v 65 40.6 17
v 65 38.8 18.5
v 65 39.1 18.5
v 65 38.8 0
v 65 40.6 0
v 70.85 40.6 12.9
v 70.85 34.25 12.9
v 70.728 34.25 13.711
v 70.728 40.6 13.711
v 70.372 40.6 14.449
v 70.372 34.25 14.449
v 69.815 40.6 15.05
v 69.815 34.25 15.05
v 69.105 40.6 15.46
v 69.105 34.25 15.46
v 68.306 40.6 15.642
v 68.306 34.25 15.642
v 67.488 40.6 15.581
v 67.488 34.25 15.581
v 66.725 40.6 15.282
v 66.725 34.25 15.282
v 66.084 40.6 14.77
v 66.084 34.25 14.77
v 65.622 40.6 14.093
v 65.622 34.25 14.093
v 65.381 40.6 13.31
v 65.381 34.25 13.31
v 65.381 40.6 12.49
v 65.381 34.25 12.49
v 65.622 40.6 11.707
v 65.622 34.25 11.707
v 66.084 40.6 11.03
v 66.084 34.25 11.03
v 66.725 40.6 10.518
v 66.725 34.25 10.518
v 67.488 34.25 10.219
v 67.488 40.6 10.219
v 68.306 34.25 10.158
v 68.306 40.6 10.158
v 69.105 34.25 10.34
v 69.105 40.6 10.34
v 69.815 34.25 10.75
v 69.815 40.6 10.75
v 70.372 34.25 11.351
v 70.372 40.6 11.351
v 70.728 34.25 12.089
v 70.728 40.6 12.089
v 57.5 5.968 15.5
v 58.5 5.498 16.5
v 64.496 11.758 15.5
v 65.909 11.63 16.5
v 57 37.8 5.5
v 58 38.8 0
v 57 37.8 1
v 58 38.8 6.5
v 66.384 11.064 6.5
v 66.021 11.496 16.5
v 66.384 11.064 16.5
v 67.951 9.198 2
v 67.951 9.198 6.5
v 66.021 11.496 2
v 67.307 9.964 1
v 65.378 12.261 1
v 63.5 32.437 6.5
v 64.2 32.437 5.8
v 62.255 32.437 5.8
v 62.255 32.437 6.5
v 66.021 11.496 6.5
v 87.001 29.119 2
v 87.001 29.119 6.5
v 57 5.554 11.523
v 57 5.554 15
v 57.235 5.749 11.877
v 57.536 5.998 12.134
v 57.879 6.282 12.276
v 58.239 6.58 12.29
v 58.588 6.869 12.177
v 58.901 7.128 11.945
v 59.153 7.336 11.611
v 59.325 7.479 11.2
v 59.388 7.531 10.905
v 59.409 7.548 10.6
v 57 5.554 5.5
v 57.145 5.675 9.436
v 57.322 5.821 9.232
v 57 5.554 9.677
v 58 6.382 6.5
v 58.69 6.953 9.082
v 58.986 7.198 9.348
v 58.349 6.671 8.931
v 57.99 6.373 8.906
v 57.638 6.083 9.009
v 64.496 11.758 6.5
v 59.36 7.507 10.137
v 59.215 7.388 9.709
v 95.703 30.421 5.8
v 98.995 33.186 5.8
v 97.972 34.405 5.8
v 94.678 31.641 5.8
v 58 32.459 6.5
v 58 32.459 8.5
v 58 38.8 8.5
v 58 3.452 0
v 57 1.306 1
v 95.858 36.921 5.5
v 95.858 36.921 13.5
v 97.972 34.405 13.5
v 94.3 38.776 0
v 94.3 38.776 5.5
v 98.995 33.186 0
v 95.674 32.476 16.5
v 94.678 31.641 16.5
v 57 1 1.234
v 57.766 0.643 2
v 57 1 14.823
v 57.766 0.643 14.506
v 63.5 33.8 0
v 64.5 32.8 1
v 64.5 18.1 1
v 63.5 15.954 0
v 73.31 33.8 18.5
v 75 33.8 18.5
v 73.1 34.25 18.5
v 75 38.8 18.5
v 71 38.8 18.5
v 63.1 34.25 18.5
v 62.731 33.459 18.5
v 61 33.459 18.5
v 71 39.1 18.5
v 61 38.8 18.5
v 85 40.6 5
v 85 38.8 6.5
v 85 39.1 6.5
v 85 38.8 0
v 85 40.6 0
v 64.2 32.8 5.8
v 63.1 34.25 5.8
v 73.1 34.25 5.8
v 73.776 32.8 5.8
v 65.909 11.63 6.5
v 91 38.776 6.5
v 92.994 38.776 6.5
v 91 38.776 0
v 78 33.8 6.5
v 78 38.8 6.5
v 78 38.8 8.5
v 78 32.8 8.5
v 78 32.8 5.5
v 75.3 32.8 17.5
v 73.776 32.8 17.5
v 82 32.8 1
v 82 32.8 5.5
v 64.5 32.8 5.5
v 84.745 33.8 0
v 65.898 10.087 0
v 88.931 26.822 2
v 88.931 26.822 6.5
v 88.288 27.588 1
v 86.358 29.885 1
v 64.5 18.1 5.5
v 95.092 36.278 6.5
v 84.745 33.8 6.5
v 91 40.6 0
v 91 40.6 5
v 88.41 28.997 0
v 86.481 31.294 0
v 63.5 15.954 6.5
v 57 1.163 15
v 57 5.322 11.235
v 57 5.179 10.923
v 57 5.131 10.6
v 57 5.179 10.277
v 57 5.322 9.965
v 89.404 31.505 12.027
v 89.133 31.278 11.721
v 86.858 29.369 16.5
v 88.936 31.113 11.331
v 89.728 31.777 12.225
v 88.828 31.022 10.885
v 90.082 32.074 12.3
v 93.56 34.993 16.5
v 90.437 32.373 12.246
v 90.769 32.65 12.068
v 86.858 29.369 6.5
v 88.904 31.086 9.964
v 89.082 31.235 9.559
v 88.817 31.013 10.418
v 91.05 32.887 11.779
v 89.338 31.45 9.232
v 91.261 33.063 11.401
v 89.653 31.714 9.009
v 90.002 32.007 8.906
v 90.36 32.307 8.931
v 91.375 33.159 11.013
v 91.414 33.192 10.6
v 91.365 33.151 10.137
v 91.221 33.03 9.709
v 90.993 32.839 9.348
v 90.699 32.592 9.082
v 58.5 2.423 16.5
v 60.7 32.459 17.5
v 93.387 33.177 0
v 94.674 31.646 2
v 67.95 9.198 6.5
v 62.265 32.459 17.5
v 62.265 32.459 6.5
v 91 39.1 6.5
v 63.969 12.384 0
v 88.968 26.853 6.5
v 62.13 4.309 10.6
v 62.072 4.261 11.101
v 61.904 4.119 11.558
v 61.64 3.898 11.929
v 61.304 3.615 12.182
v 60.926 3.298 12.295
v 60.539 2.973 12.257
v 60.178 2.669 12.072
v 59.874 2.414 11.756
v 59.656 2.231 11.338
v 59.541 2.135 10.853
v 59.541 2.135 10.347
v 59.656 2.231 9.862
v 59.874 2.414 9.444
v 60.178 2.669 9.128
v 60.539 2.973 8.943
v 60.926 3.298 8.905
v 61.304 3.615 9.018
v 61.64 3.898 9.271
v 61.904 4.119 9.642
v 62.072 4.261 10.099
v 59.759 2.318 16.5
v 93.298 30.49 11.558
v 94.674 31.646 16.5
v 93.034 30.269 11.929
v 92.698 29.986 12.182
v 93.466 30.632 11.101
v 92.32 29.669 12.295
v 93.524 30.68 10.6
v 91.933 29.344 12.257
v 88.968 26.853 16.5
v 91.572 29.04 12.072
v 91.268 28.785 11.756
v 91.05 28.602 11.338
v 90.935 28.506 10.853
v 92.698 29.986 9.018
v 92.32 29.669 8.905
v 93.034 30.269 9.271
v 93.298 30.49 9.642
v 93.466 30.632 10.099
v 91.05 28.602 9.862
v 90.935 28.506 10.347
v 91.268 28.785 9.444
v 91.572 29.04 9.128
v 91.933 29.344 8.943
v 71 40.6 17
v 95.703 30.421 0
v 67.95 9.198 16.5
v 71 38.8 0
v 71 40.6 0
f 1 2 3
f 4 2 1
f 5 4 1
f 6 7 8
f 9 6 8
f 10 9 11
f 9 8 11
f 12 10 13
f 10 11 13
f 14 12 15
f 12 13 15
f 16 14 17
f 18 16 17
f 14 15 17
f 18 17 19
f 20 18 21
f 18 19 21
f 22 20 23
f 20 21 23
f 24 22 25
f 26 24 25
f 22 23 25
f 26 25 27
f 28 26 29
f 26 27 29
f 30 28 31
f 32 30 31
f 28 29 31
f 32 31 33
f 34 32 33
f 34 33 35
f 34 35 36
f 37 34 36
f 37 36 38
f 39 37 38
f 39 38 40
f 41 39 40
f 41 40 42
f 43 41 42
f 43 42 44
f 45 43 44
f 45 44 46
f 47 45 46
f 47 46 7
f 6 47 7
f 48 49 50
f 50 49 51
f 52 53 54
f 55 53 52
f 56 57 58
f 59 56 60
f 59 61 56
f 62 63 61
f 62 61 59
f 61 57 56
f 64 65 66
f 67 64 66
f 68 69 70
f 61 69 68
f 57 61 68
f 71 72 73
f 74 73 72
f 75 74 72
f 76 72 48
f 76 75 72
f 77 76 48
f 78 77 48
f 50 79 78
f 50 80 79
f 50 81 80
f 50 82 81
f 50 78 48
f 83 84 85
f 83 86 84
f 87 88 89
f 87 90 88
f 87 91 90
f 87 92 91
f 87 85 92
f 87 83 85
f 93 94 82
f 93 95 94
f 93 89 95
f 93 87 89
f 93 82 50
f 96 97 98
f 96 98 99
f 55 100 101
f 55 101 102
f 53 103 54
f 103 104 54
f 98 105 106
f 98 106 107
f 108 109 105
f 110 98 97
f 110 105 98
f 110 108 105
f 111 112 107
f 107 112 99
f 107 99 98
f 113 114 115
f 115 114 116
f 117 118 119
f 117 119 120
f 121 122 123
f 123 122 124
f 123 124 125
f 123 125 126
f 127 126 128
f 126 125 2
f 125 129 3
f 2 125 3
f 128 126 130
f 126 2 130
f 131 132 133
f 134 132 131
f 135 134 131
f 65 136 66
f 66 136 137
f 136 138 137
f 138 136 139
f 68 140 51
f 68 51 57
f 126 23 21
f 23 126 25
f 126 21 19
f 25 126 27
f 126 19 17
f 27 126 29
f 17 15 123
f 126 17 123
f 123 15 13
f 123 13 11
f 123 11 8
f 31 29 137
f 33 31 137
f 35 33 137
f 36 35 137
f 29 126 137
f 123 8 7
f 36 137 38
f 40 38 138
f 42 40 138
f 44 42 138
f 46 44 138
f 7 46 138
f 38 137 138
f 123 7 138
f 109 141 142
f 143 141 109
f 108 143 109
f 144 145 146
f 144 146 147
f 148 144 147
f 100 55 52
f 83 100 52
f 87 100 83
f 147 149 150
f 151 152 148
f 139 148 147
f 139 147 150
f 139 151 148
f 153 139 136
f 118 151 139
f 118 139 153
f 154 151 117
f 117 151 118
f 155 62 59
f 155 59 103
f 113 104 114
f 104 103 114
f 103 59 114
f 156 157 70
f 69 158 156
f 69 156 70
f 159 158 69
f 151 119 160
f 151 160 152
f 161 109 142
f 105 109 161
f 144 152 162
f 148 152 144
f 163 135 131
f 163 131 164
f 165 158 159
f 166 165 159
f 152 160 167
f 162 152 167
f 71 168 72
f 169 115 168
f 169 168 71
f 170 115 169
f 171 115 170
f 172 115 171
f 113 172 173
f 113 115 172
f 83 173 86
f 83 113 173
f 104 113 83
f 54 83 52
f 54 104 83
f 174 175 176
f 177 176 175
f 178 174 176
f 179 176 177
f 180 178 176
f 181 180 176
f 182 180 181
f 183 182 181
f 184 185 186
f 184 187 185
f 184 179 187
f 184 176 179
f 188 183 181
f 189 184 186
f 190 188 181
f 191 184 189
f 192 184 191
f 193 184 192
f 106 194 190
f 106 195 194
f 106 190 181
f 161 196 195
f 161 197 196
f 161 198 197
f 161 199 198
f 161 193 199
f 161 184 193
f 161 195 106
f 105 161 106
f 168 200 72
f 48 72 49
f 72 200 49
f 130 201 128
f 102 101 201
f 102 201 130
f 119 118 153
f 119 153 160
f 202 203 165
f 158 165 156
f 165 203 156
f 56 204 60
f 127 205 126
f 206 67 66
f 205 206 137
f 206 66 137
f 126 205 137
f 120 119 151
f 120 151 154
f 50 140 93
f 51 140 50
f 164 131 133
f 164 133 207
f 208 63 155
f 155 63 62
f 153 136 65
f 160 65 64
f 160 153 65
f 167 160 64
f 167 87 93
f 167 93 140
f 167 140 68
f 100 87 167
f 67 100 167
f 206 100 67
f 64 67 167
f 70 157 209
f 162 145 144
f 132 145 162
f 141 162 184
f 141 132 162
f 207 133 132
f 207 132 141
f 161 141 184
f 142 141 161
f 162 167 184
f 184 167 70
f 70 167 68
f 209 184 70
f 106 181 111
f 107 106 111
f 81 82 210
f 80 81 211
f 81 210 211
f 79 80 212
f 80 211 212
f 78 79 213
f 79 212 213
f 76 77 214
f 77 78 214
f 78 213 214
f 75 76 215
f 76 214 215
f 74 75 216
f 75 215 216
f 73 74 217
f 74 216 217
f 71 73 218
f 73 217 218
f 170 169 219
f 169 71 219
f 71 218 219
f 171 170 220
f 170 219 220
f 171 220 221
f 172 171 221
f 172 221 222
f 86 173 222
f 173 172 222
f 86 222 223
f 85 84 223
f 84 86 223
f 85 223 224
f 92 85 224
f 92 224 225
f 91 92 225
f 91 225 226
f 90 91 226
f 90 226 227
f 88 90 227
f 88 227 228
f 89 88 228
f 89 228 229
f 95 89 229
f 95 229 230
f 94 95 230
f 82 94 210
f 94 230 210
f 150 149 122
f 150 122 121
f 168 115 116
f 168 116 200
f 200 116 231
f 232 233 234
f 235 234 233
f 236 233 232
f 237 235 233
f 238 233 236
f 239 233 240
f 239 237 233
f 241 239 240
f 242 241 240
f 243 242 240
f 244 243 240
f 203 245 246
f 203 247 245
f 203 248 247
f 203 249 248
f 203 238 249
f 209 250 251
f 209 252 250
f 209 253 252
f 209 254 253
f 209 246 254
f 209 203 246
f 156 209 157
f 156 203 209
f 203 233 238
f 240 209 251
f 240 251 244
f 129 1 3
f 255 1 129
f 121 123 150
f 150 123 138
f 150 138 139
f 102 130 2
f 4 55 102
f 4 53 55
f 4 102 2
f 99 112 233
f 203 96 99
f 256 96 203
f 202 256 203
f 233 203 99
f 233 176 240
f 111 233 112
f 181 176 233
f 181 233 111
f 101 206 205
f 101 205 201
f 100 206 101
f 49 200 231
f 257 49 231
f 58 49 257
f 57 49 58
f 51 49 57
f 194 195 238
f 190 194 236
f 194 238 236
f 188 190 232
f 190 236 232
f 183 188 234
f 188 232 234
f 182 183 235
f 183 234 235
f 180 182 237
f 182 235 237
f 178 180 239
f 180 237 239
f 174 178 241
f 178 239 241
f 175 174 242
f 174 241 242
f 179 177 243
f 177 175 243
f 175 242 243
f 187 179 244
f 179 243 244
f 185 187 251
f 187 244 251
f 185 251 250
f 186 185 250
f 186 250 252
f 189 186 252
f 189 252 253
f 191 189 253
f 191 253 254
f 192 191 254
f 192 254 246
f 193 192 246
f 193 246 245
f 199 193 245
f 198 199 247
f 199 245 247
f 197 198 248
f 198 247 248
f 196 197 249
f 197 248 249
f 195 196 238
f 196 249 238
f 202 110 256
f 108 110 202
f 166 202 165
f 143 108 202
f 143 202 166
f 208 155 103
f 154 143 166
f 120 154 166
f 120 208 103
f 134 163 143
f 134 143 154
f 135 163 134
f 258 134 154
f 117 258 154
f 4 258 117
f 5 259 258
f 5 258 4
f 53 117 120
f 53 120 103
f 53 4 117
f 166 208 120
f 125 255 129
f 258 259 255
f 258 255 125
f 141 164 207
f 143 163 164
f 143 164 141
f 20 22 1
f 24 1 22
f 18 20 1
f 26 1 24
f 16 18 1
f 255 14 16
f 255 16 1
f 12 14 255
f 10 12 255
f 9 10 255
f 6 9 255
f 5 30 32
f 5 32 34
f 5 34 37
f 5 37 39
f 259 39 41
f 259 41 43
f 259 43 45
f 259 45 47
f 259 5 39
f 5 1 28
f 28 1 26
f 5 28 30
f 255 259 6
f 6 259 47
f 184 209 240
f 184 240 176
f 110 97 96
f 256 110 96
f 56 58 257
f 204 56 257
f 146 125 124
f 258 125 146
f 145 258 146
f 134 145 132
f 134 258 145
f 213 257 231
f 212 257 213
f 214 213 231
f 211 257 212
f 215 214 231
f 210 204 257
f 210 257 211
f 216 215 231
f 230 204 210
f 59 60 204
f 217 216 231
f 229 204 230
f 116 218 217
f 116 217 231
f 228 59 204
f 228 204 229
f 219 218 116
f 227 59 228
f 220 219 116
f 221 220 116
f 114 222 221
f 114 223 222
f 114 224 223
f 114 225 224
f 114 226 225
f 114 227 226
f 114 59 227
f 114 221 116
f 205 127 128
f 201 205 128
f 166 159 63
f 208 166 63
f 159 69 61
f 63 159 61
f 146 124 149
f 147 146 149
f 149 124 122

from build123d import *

# Parameters (mm, degrees)
PAD019_DEPTH     = 18.5
POCKET042_DEPTH  = 13
POCKET043_DEPTH  = 5
POCKET044_DEPTH  = 15
CHAMFER018_SIZE  = 3
CHAMFER019_SIZE  = 2
CHAMFER020_SIZE  = 1
CHAMFER021_SIZE  = 1
CHAMFER022_SIZE  = 1
CHAMFER023_SIZE  = 1
CHAMFER024_SIZE  = 1
CHAMFER025_SIZE  = 1.5
CHAMFER026_SIZE  = 1
CHAMFER027_SIZE  = 1
CHAMFER028_SIZE  = 1
CHAMFER029_SIZE  = 1
CHAMFER030_SIZE  = 1.5
CHAMFER031_SIZE2 = 3
CHAMFER031_SIZE  = 10
CHAMFER032_SIZE2 = 10
CHAMFER032_SIZE  = 3
CHAMFER033_SIZE  = 1
CHAMFER034_SIZE  = 1.5
CHAMFER035_SIZE  = 1
SKETCH082_R      = 2.75
POCKET045_DEPTH  = 12
SKETCH083_R      = 1.7
POCKET046_DEPTH  = 5


with BuildPart() as part:
    # Sketch078 → Pad019 (new body)
    with BuildSketch(Plane.XY):
        Polygon((0, 38.8), (8, 38.8), (8, 40.6), (14, 40.6), (14, 38.8), (28, 38.8), (28, 40.6), (34, 40.6), (34, 38.7761214391), (37.3, 38.7761214391), (41.9953022309, 33.1864759261), (38.7027713123, 30.4207499545), (37.673663974, 31.6458777382), (31.9308774881, 26.82193709), (30.0013012288, 29.1190516844), (9.0209879336, 11.4955885164), (10.9505641929, 9.198473922), (0, 0), align=None)
        Polygon((7.5, 32.8), (7.5, 18.1), (25, 32.8), align=None, mode=Mode.SUBTRACT)
    extrude(amount=PAD019_DEPTH)

    # Sketch079 → Pocket042 (cut)
    with BuildSketch(Plane.XY.offset(6.5)):
        Polygon((0, 5.5542995553), (8.2661306752, 12.395656), (10.9598026716, 9.1854627211), (31.9879670751, 26.8301877163), (29.8577953381, 29.3688275367), (38.9152591587, 36.9689420879), (34.890976, 41.764896), (21, 41.764896), (21, 32.458794), (1, 32.458794), (1, 41.759258), (0, 41.764896), align=None)
    extrude(amount=POCKET042_DEPTH, mode=Mode.SUBTRACT)

    # Sketch080 → Pocket043 (cut)
    with BuildSketch(Plane.XY.offset(16.5)):
        Polygon((-0.8541061726, -4.3526620467), (49.194970654, 37.6434998606), (44.0526697777, 43.7718554052), (-5.9964070501, 1.7756934982), align=None)
    extrude(amount=POCKET043_DEPTH, mode=Mode.SUBTRACT)

    # Sketch081 → Pocket044 (cut)
    with BuildSketch(Plane.XY.offset(5.8)):
        Polygon((37.0972154509, 31.1536445146), (41.470166846, 34.8229864174), (44.3478623025, 31.3934825187), (39.9749109074, 27.724140616), align=None)
        Polygon((6.1, 34.25), (16.1, 34.25), (16.9452365235, 32.4373844259), (5.2547634765, 32.4373844259), align=None)
    extrude(amount=POCKET044_DEPTH, mode=Mode.SUBTRACT)

    # Chamfer018
    chamfer018_edges = [part.edges().sort_by_distance(p)[0] for p in [
        (39.915045, 35.662973, 16.5),
    ]]
    chamfer(chamfer018_edges, length=CHAMFER018_SIZE)

    # Chamfer019
    chamfer019_edges = [part.edges().sort_by_distance(p)[0] for p in [
        (5.475282, 4.599237, 0),
        (19.511145, 20.30732, 0),
        (34.802271, 29.233907, 0),
    ]]
    chamfer(chamfer019_edges, length=CHAMFER019_SIZE)

    # Chamfer020
    chamfer020_edges = [part.edges().sort_by_distance(p)[0] for p in [
        (9.342584, 11.112736, 0),
        (8.377796, 12.261293, 0),
        (29.358109, 29.884757, 0),
        (30.322897, 28.736199, 0),
    ]]
    chamfer(chamfer020_edges, length=CHAMFER020_SIZE)

    # Chamfer021
    chamfer021_edges = [part.edges().sort_by_distance(p)[0] for p in [
        (7.5, 25.45, 0),
        (16.25, 25.45, 0),
        (16.25, 32.8, 0),
    ]]
    chamfer(chamfer021_edges, length=CHAMFER021_SIZE)

    # Chamfer022
    chamfer022_edges = [part.edges().sort_by_distance(p)[0] for p in [
        (0, 20.705986, 0),
        (0, 22.17715, 6.5),
    ]]
    chamfer(chamfer022_edges, length=CHAMFER022_SIZE)

    # Chamfer023
    chamfer023_edges = [part.edges().sort_by_distance(p)[0] for p in [
        (0, 38.8, 3.25),
    ]]
    chamfer(chamfer023_edges, length=CHAMFER023_SIZE)

    # Chamfer024
    chamfer024_edges = [part.edges().sort_by_distance(p)[0] for p in [
        (0, 0, 9.25),
    ]]
    chamfer(chamfer024_edges, length=CHAMFER024_SIZE)

    # Chamfer025
    chamfer025_edges = [part.edges().sort_by_distance(p)[0] for p in [
        (0, 3.27715, 16.5),
    ]]
    chamfer(chamfer025_edges, length=CHAMFER025_SIZE)

    # Chamfer026
    chamfer026_edges = [part.edges().sort_by_distance(p)[0] for p in [
        (4.883065, 9.595706, 16.5),
    ]]
    chamfer(chamfer026_edges, length=CHAMFER026_SIZE)

    # Chamfer027
    chamfer027_edges = [part.edges().sort_by_distance(p)[0] for p in [
        (1.132852, 0.951596, 16.132852),
    ]]
    chamfer(chamfer027_edges, length=CHAMFER027_SIZE)

    # Chamfer028
    chamfer028_edges = [part.edges().sort_by_distance(p)[0] for p in [
        (8.266131, 12.395656, 11),
    ]]
    chamfer(chamfer028_edges, length=CHAMFER028_SIZE)

    # Chamfer029
    chamfer029_edges = [part.edges().sort_by_distance(p)[0] for p in [
        (38.079114, 37.848605, 6.5),
    ]]
    chamfer(chamfer029_edges, length=CHAMFER029_SIZE)

    # Chamfer030
    chamfer030_edges = [part.edges().sort_by_distance(p)[0] for p in [
        (31, 40.6, 6.5),
    ]]
    chamfer(chamfer030_edges, length=CHAMFER030_SIZE)

    # Chamfer031
    chamfer031_edges = [part.edges().sort_by_distance(p)[0] for p in [
        (21, 35.8, 18.5),
    ]]
    chamfer031_side = part.faces().sort_by_distance((21, 35.8, 12.5))[0]
    chamfer(chamfer031_edges, length=CHAMFER031_SIZE, length2=CHAMFER031_SIZE2, reference=chamfer031_side)

    # Chamfer032
    chamfer032_edges = [part.edges().sort_by_distance(p)[0] for p in [
        (1, 35.629397, 18.5),
    ]]
    chamfer032_side = part.faces().sort_by_distance((9.318343, 36.537604, 18.5))[0]
    chamfer(chamfer032_edges, length=CHAMFER032_SIZE, length2=CHAMFER032_SIZE2, reference=chamfer032_side)

    # Chamfer033
    chamfer033_edges = [part.edges().sort_by_distance(p)[0] for p in [
        (17.388073, 32.8, 18.5),
        (4.632373, 32.458794, 18.5),
    ]]
    chamfer(chamfer033_edges, length=CHAMFER033_SIZE)

    # Chamfer034
    chamfer034_edges = [part.edges().sort_by_distance(p)[0] for p in [
        (11, 40.6, 18.5),
    ]]
    chamfer(chamfer034_edges, length=CHAMFER034_SIZE)

    # Chamfer035
    chamfer035_edges = [part.edges().sort_by_distance(p)[0] for p in [
        (23, 32.8, 6.5),
        (16.25, 25.45, 6.5),
        (7.5, 25.268692, 6.5),
    ]]
    chamfer(chamfer035_edges, length=CHAMFER035_SIZE)

    # Sketch082 → Pocket045 (cut)
    with BuildSketch(Plane.XZ.offset(-30)):
        with Locations((11.1, 12.9)):
            Circle(SKETCH082_R)
    extrude(amount=-POCKET045_DEPTH, mode=Mode.SUBTRACT)

    # Sketch083 (on DatumPlane) → Pocket046 (cut)
    with BuildSketch(Plane(origin=(0, 0, 0), x_dir=(0.7657048648, 0.6431920864, 0), z_dir=(0.6431920864, -0.7657048648, 0))):
        with Locations((5, 10.6)):
            Circle(SKETCH083_R)
        with Locations((46, 10.6)):
            Circle(SKETCH083_R)
    extrude(amount=-POCKET046_DEPTH, mode=Mode.SUBTRACT)


with BuildPart() as part_1:
    # Body015 placement: moved
    add(part.part.moved(Location((57, 0, 0))))


solid = part_1.part
